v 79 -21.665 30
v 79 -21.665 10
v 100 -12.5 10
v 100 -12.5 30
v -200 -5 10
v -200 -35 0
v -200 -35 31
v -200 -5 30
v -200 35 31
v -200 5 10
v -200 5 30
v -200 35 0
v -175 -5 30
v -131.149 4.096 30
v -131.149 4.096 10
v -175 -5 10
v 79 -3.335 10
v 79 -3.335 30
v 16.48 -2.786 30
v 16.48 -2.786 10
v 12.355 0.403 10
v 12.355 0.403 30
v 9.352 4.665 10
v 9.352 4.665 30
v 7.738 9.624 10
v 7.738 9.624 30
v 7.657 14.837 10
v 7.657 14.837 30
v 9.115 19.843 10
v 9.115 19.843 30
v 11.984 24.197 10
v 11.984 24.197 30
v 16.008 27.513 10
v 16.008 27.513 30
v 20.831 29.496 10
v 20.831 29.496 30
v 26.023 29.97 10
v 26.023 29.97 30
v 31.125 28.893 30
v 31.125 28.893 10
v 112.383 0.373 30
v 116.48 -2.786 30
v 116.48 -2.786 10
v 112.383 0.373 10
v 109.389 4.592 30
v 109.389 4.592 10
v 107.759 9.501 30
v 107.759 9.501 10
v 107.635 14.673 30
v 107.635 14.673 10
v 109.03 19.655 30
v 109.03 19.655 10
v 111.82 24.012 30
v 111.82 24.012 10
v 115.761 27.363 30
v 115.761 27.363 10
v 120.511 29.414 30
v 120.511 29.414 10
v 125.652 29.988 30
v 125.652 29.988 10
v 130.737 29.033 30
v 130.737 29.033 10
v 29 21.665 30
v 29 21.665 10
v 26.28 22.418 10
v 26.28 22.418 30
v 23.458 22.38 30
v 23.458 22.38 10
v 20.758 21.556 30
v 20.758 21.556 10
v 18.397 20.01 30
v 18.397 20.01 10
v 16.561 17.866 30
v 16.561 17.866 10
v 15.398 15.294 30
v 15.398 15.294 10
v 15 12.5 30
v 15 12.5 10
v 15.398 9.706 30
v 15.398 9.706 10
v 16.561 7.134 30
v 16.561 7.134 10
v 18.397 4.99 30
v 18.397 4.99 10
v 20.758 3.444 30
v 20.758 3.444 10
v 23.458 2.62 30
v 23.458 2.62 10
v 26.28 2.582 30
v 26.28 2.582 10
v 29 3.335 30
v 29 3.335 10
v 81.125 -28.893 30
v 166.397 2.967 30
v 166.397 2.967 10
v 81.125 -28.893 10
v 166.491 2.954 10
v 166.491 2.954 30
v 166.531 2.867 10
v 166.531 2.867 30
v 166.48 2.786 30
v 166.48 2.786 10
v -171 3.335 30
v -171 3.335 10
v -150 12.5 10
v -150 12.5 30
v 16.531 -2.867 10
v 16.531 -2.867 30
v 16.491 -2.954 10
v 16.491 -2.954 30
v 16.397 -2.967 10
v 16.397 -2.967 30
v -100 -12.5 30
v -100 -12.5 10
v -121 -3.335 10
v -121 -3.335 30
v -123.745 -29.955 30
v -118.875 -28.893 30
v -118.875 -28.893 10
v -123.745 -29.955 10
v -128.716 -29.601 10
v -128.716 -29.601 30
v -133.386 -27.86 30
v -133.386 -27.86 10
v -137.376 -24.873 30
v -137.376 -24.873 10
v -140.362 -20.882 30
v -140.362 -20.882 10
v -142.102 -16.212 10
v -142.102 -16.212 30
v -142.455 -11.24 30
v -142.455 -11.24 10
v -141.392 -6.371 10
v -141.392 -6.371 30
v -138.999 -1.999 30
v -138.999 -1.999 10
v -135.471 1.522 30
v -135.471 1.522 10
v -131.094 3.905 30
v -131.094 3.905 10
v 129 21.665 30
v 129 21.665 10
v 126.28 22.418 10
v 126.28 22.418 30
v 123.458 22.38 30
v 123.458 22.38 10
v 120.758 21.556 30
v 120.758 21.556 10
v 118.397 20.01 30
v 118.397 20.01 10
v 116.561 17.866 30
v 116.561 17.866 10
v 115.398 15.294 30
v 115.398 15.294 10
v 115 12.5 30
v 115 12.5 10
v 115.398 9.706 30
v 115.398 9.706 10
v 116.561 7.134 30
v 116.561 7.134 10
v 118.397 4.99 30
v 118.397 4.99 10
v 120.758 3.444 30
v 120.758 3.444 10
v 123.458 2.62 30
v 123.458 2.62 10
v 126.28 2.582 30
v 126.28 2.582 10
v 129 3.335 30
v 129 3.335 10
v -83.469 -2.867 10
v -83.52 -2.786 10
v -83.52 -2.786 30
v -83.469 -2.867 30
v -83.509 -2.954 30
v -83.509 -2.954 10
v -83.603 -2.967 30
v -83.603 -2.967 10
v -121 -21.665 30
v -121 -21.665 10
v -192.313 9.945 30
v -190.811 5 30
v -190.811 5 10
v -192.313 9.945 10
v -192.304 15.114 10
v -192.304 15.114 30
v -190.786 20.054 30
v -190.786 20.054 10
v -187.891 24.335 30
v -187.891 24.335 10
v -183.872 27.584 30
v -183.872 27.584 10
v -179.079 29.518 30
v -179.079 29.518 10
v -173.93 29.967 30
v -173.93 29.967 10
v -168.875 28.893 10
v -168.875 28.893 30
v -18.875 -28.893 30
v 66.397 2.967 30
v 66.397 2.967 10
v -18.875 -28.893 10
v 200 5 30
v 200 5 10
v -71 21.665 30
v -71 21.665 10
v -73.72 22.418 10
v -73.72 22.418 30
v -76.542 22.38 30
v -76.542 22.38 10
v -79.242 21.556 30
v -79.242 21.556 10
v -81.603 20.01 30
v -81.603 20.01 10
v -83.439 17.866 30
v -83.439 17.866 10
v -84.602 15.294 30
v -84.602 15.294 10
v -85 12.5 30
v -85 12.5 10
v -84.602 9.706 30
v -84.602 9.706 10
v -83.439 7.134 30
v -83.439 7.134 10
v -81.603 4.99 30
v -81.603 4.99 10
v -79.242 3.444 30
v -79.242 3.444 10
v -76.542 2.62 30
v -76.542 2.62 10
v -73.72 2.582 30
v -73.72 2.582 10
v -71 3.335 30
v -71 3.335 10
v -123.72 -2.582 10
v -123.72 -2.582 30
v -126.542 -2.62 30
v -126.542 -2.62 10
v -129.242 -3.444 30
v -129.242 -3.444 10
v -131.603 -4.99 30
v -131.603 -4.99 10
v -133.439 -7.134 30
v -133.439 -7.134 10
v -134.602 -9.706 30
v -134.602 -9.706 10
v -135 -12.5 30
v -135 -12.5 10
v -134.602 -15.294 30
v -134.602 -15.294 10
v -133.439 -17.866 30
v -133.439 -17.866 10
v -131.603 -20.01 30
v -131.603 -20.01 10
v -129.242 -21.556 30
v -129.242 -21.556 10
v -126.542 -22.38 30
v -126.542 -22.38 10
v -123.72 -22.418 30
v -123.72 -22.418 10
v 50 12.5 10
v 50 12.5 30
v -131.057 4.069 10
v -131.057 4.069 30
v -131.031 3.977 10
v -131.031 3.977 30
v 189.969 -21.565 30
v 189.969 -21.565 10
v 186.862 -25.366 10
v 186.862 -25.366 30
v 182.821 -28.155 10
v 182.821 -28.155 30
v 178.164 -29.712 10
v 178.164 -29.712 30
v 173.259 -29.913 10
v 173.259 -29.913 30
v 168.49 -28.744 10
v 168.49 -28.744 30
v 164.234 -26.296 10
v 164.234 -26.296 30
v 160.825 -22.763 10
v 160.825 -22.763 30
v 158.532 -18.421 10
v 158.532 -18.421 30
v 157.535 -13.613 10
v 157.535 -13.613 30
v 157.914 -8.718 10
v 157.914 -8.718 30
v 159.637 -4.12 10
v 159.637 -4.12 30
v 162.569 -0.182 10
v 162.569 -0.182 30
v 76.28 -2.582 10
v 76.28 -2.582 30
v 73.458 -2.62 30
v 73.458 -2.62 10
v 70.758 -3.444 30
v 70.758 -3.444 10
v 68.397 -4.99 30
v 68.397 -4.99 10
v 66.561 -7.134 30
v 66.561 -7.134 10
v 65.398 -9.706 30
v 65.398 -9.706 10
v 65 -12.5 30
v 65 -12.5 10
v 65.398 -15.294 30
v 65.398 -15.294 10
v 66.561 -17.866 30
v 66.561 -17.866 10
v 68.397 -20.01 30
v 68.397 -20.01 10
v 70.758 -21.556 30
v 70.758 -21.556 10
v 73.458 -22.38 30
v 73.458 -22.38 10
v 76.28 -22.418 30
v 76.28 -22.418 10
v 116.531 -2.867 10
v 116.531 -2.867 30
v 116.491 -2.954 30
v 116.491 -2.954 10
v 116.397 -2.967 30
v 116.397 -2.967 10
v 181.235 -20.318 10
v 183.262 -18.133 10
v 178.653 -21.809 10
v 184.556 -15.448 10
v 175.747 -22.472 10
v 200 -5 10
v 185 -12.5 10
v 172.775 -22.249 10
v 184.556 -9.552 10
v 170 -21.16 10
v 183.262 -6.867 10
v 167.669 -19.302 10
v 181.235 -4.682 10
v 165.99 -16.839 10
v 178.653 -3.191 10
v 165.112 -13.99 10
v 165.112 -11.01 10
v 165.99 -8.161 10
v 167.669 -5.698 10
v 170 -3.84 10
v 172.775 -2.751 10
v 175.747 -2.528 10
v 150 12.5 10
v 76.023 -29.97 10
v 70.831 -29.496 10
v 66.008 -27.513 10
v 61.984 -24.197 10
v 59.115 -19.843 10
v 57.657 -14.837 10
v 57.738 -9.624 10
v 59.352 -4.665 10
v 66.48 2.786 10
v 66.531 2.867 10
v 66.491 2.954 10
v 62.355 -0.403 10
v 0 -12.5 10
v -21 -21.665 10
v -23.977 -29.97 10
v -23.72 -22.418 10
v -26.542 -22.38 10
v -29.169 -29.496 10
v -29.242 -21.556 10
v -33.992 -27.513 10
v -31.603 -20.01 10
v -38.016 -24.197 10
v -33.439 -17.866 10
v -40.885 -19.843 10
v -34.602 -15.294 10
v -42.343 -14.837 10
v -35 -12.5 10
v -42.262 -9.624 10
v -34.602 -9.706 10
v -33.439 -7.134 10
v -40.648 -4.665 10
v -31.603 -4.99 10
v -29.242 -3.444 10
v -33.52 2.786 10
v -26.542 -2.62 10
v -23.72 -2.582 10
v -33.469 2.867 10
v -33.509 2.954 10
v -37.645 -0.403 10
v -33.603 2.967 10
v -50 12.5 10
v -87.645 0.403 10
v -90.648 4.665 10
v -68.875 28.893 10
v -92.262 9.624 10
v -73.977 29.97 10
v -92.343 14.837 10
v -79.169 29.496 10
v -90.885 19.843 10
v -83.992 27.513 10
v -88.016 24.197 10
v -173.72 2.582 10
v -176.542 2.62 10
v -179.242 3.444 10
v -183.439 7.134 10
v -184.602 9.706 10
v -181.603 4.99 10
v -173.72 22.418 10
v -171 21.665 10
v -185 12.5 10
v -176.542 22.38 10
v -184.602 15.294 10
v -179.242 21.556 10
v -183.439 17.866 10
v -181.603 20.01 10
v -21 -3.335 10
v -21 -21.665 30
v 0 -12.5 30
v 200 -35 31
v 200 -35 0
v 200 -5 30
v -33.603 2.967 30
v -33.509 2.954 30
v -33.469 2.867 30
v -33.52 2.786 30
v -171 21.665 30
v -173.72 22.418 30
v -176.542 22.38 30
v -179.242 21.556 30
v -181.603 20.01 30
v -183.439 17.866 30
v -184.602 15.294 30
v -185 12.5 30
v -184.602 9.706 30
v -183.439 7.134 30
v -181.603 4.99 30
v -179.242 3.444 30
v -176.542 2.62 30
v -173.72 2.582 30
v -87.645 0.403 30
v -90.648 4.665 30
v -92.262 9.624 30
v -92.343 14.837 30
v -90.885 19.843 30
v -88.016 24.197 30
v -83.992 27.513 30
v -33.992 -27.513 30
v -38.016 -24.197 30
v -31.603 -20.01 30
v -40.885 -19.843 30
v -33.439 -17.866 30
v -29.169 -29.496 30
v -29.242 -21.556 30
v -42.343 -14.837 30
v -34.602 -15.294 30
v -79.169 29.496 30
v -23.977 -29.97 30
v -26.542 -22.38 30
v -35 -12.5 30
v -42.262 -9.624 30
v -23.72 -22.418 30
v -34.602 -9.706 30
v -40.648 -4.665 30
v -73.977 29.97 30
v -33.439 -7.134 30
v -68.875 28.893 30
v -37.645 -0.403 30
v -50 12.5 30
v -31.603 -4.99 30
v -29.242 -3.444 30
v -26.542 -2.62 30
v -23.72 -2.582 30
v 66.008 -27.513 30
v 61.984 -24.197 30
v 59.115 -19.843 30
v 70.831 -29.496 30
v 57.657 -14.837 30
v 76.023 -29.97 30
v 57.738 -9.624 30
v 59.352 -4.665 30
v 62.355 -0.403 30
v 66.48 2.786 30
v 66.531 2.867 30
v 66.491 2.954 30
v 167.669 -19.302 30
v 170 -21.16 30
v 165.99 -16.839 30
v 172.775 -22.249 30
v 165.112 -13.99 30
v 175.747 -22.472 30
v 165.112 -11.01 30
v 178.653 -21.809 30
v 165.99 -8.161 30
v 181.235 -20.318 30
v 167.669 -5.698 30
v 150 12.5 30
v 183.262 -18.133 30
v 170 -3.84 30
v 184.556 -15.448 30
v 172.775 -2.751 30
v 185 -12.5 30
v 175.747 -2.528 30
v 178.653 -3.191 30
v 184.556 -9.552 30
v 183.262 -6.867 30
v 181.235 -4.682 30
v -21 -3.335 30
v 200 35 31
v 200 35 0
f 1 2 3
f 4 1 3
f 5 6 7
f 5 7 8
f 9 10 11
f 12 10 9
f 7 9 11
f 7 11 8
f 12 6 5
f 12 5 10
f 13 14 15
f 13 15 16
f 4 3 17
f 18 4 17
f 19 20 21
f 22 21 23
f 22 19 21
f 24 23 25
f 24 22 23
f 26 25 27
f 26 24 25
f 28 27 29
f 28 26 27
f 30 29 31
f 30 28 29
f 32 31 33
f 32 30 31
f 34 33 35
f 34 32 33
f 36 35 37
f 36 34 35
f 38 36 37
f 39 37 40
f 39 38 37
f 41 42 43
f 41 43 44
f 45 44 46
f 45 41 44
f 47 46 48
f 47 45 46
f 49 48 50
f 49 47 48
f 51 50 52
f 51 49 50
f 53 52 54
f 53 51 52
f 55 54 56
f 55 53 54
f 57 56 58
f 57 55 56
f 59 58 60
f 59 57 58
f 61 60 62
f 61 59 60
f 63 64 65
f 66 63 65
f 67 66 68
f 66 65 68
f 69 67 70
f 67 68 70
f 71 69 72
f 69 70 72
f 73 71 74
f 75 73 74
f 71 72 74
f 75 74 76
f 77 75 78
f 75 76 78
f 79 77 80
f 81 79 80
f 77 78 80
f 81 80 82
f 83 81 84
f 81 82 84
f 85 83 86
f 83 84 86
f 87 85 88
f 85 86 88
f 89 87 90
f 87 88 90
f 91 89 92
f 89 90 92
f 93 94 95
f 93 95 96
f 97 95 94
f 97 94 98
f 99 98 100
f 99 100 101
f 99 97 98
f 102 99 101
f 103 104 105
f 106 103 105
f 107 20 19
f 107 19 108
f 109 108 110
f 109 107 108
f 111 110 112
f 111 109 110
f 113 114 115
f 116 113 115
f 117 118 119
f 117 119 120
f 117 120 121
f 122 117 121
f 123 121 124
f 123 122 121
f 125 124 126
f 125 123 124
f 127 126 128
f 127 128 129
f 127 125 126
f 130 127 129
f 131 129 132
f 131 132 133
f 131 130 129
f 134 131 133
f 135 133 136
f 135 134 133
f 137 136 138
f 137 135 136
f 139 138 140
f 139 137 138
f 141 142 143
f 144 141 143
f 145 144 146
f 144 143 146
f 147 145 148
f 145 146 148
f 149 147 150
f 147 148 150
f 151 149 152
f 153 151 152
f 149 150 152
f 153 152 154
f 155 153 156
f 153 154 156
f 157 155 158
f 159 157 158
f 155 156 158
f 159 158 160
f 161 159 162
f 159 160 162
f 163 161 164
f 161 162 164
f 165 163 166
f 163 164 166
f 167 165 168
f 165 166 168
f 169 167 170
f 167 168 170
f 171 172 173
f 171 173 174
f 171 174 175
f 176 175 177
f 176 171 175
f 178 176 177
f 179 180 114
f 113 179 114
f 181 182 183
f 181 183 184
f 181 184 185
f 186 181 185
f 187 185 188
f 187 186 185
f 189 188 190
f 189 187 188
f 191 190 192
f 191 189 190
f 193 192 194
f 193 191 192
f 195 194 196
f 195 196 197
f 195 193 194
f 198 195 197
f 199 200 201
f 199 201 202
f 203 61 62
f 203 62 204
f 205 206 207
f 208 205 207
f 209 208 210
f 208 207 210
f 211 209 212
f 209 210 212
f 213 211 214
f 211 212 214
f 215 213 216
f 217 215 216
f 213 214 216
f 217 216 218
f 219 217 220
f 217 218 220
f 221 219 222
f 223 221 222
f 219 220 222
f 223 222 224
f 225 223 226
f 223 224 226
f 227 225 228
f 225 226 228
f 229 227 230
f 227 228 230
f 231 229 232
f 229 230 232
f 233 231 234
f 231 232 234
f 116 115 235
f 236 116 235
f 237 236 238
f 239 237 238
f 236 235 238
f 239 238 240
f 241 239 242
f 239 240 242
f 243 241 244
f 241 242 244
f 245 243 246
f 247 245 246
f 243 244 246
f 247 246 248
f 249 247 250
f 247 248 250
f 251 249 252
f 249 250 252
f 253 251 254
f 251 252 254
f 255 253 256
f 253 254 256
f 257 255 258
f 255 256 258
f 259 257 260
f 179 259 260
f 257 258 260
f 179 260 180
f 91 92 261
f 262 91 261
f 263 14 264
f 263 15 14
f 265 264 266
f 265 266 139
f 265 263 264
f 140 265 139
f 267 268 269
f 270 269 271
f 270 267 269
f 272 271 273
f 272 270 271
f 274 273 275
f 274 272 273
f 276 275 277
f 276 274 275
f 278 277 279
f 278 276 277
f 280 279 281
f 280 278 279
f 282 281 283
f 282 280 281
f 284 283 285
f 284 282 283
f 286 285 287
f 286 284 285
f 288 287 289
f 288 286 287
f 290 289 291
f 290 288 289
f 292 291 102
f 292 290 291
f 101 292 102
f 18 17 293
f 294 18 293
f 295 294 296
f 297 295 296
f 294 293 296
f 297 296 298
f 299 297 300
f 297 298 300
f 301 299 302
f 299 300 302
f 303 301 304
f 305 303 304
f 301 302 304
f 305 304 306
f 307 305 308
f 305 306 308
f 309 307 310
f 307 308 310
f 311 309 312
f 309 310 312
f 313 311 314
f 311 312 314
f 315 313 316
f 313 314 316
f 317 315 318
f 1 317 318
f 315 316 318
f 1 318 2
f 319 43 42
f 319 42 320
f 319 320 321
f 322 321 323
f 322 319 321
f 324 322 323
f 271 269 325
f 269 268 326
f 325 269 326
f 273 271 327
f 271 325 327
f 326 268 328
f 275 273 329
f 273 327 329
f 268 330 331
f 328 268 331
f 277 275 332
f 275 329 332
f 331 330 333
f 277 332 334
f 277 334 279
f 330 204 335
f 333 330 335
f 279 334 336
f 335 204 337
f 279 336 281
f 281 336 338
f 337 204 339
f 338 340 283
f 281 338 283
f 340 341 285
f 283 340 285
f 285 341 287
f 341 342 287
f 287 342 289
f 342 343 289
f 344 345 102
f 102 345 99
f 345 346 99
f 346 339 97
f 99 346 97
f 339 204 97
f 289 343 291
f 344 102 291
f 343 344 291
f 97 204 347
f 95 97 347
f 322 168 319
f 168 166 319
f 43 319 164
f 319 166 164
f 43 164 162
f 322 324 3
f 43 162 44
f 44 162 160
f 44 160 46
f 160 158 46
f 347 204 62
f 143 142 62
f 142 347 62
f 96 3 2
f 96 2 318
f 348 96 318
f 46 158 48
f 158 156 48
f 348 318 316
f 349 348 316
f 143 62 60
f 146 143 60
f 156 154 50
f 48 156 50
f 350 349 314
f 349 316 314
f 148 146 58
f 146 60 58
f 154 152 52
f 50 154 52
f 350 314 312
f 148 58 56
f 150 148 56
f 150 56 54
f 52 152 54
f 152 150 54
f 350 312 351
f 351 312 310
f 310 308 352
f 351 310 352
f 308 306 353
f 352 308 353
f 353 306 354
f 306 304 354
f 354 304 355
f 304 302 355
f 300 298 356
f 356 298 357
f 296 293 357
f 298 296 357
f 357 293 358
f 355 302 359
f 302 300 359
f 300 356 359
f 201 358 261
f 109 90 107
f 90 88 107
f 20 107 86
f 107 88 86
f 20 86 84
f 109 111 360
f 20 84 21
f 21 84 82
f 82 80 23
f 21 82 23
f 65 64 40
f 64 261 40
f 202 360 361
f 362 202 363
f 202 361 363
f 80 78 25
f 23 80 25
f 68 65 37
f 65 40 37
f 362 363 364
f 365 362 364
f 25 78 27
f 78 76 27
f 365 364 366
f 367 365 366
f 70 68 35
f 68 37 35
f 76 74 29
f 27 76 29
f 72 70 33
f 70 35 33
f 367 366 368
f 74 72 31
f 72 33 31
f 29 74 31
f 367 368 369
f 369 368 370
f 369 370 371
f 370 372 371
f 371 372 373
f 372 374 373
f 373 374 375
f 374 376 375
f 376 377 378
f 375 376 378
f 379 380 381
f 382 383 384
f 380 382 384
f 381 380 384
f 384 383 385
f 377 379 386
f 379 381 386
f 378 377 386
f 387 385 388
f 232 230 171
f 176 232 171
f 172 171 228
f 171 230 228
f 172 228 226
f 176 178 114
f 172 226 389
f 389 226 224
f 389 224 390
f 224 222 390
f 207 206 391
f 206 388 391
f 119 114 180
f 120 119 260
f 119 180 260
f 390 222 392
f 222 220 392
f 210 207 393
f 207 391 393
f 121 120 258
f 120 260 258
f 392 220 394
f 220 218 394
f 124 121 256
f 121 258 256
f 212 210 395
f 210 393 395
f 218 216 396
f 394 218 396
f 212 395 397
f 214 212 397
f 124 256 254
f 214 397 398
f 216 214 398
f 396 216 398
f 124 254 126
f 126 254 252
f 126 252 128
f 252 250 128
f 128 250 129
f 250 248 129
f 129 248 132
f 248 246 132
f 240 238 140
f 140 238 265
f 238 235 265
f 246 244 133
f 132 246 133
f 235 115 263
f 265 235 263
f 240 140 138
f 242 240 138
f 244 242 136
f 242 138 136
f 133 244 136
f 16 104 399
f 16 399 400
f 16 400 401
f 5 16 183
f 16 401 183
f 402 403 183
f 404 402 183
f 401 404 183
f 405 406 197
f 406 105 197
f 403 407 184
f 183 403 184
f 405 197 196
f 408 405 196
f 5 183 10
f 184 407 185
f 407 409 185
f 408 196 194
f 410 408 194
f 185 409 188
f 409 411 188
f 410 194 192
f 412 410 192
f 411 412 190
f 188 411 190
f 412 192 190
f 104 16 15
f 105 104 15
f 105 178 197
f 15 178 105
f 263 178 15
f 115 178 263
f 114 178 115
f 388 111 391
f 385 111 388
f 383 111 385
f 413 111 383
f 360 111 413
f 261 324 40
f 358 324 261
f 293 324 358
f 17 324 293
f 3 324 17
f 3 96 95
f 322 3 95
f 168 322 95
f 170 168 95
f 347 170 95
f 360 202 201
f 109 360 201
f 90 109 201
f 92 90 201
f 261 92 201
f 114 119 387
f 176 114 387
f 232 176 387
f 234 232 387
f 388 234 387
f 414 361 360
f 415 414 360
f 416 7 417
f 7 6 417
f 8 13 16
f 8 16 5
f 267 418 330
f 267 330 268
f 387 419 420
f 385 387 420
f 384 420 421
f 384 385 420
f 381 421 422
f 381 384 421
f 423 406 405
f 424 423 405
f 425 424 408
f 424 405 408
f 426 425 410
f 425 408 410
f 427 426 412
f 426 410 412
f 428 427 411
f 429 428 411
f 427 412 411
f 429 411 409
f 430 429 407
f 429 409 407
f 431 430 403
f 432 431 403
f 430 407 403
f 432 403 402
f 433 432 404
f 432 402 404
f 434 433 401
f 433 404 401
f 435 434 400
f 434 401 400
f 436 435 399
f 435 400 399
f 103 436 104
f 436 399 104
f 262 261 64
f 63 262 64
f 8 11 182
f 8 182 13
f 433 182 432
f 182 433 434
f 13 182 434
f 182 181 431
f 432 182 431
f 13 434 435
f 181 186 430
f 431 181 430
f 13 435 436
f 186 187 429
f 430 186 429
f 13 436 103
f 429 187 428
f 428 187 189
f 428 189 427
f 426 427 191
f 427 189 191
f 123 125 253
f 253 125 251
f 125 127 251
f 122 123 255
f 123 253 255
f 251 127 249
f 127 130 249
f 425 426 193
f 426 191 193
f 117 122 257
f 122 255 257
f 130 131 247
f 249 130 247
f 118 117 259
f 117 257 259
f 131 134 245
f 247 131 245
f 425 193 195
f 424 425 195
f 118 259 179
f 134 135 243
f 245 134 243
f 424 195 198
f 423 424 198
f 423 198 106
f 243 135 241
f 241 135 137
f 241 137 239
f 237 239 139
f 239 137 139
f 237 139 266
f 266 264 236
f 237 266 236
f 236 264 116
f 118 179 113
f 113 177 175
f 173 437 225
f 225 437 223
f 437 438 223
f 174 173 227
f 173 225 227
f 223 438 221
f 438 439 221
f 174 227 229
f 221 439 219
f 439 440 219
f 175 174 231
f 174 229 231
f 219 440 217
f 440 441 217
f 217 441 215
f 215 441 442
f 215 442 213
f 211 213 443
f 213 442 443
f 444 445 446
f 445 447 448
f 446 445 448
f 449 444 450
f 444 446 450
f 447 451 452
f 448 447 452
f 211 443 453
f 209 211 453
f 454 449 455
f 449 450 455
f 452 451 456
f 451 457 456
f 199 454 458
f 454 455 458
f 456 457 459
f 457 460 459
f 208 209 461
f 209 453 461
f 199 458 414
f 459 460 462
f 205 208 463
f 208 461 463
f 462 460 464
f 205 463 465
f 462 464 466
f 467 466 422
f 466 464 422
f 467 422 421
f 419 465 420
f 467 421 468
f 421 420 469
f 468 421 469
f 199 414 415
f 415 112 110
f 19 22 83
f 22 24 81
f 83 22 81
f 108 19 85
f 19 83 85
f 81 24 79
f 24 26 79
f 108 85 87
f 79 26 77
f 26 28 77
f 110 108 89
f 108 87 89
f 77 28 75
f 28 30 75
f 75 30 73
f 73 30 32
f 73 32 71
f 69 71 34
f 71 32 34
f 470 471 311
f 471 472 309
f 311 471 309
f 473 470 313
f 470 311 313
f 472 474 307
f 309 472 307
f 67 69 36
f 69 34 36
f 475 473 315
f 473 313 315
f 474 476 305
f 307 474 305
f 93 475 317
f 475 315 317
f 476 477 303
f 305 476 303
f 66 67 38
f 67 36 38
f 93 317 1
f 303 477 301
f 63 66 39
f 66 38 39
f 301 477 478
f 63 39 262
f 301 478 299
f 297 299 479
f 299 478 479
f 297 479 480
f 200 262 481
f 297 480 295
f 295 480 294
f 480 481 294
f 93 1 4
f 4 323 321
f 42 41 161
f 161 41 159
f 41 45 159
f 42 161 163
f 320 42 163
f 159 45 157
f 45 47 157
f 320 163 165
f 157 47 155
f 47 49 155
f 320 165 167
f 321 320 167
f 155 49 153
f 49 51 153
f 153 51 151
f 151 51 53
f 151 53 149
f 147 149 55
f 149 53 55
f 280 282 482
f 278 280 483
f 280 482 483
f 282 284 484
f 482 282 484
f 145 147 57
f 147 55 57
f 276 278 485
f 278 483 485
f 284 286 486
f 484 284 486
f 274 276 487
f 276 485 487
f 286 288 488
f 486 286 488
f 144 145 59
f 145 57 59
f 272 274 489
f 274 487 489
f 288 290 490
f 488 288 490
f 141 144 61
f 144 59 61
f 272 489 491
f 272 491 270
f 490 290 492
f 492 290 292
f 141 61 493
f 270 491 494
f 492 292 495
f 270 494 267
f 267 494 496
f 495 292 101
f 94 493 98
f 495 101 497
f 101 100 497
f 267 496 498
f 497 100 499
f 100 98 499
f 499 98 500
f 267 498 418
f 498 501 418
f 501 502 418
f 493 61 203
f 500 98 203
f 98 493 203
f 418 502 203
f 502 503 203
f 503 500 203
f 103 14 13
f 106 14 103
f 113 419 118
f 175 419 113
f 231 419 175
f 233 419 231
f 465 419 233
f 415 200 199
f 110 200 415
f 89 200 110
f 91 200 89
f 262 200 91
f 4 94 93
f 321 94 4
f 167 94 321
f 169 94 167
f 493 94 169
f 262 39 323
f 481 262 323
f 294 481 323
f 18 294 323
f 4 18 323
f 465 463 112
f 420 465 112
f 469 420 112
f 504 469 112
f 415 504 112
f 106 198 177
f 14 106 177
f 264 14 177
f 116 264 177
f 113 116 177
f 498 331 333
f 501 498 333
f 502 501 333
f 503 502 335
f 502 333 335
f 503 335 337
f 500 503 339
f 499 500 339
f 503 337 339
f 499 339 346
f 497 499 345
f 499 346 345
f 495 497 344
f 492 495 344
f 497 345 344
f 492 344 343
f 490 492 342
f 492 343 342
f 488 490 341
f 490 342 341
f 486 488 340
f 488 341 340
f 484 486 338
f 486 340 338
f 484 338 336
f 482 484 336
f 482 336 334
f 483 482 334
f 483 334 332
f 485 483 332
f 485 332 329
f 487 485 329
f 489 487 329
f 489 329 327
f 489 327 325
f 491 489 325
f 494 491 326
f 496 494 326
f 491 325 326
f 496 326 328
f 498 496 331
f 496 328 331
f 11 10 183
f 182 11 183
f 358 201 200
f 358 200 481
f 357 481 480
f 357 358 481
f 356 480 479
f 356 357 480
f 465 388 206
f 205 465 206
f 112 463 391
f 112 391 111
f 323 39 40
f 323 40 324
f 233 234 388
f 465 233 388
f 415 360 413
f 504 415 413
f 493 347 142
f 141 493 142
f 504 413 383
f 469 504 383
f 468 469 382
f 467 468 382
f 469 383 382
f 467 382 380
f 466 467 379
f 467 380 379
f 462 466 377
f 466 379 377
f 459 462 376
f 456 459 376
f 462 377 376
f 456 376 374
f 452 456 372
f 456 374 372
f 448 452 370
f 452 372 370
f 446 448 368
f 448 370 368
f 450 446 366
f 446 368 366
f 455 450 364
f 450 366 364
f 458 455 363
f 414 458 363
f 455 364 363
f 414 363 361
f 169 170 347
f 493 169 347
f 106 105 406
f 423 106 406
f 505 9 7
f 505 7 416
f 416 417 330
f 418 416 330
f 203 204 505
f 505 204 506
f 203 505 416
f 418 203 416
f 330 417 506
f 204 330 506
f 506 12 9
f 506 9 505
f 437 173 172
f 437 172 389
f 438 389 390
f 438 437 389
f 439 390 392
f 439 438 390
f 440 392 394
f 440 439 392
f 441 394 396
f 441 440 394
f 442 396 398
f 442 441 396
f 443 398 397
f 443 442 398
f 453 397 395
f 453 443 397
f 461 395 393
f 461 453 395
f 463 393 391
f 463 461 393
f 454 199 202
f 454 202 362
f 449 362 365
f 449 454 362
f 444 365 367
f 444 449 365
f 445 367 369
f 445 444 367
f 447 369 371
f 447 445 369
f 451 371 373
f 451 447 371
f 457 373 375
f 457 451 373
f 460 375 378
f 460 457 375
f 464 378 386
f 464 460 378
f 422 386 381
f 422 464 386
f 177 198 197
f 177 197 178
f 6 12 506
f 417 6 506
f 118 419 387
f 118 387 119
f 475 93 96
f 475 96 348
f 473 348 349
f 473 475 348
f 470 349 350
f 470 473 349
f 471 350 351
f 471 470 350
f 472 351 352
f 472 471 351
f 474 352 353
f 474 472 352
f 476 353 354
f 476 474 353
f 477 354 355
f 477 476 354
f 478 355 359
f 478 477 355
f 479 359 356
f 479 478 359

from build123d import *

# Parameters (mm, degrees)
SKETCH1_W           = 400
SKETCH1_H           = 70
BOSS_EXTRUDE1_DEPTH = 30
CUT_EXTRUDE1_DEPTH  = 20
FILLET1_R           = 0.1
FILLET2_START       = 10
FILLET2_DEPTH       = 21
BOSS_EXTRUDE2_DEPTH = 20
LPATTERN1_COUNT     = 4
LPATTERN1_PITCH     = 100
BOSS_EXTRUDE3_DEPTH = 20
LPATTERN2_COUNT     = 3
LPATTERN2_PITCH     = 100
SKETCH5_R           = 10
BOSS_EXTRUDE4_DEPTH = 20
SKETCH6_W           = 400
SKETCH6_H           = 70
BOSS_EXTRUDE5_DEPTH = 1


with BuildPart() as part:
    # Sketch1 → Boss-Extrude1 (new body)
    with BuildSketch(Plane.XY):
        Rectangle(SKETCH1_W, SKETCH1_H)
    extrude(amount=BOSS_EXTRUDE1_DEPTH)

    # Sketch2 → Cut-Extrude1 (cut)
    with BuildSketch(Plane.XY.offset(30)):
        with BuildLine():
            Line((-128.697541479, 4.604917042), (-175, -5))
            Line((-175, -5), (-200, -5))
            Line((-200, -5), (-200, 5))
            Line((-200, 5), (-190.811388301, 5))
            ThreePointArc((-190.811388301, 5), (-187.890958939, 24.335251481), (-168.875, 28.893119746))
            Line((-168.875, 28.893119746), (-81.125, -3.893119746))
            ThreePointArc((-81.125, -3.893119746), (-91.393119746, 18.625), (-68.875, 28.893119746))
            Line((-68.875, 28.893119746), (18.875, -3.893119746))
            ThreePointArc((18.875, -3.893119746), (8.606880254, 18.625), (31.125, 28.893119746))
            Line((31.125, 28.893119746), (118.875, -3.893119746))
            ThreePointArc((118.875, -3.893119746), (108.53578111, 18.431230593), (130.736636107, 29.033027738))
            Line((130.736636107, 29.033027738), (200, 5))
            Line((200, 5), (200, -5))
            Line((200, -5), (189.969387627, -21.564625424))
            ThreePointArc((189.969387627, -21.564625424), (161.524837834, -23.665572292), (168.875, 3.893119746))
            Line((168.875, 3.893119746), (81.125, -28.893119746))
            ThreePointArc((81.125, -28.893119746), (58.606880254, -18.625), (68.875, 3.893119746))
            Line((68.875, 3.893119746), (-18.875, -28.893119746))
            ThreePointArc((-18.875, -28.893119746), (-41.393119746, -18.625), (-31.125, 3.893119746))
            Line((-31.125, 3.893119746), (-118.875, -28.893119746))
            ThreePointArc((-118.875, -28.893119746), (-141.792937679, -17.424149076), (-128.697541479, 4.604917042))
        make_face()
    extrude(amount=-CUT_EXTRUDE1_DEPTH, mode=Mode.SUBTRACT)

    # Fillet1
    fillet1_edges = [part.edges().sort_by_distance(p)[0] for p in [
        (-128.697541479, 4.604917042, 20),
    ]]
    fillet(fillet1_edges, radius=FILLET1_R)

    # Fillet2: read off the stored shape, not the designer's step
    # Fillet2 outline → Fillet2 (cut)
    with BuildSketch(Plane.XY.offset(FILLET2_START)):
        with BuildLine():
            ThreePointArc((-33.603406746, 2.967106787), (-33.477636502, 2.91539326), (-33.519722617, 2.786082773))
            ThreePointArc((-33.519722617, 2.786082773), (-32.343252539, 3.384792796), (-31.125, 3.893119746))
            Line((-31.125, 3.893119746), (-33.603406746, 2.967106787))
        make_face()
        with BuildLine():
            ThreePointArc((66.396593254, 2.967106787), (66.522363498, 2.91539326), (66.480277383, 2.786082773))
            ThreePointArc((66.480277383, 2.786082773), (67.656747461, 3.384792796), (68.875, 3.893119746))
            Line((68.875, 3.893119746), (66.396593254, 2.967106787))
        make_face()
        with BuildLine():
            ThreePointArc((166.396593254, 2.967106787), (166.522363498, 2.91539326), (166.480277383, 2.786082773))
            ThreePointArc((166.480277383, 2.786082773), (167.656747461, 3.384792796), (168.875, 3.893119746))
            Line((168.875, 3.893119746), (166.396593254, 2.967106787))
        make_face()
        with BuildLine():
            ThreePointArc((116.480277383, -2.786082773), (116.522363498, -2.91539326), (116.396593254, -2.967106787))
            Line((116.396593254, -2.967106787), (118.875, -3.893119746))
            ThreePointArc((118.875, -3.893119746), (117.656747461, -3.384792796), (116.480277383, -2.786082773))
        make_face()
        with BuildLine():
            ThreePointArc((-81.125, -3.893119746), (-82.343252539, -3.384792796), (-83.519722617, -2.786082773))
            ThreePointArc((-83.519722617, -2.786082773), (-83.477636502, -2.91539326), (-83.603406746, -2.967106787))
            Line((-83.603406746, -2.967106787), (-81.125, -3.893119746))
        make_face()
        with BuildLine():
            ThreePointArc((16.480277383, -2.786082773), (16.522363498, -2.91539326), (16.396593254, -2.967106787))
            Line((16.396593254, -2.967106787), (18.875, -3.893119746))
            ThreePointArc((18.875, -3.893119746), (17.656747461, -3.384792796), (16.480277383, -2.786082773))
        make_face()
    extrude(amount=FILLET2_DEPTH, mode=Mode.SUBTRACT)

    # Sketch3 → Boss-Extrude2 (add)
    with BuildSketch(Plane.XY.offset(10)):
        with BuildLine():
            Line((-171, 3.33484861), (-150, 12.5))
            Line((-150, 12.5), (-171, 21.66515139))
            ThreePointArc((-171, 21.66515139), (-185, 12.5), (-171, 3.33484861))
        make_face()
    boss_extrude2 = extrude(amount=BOSS_EXTRUDE2_DEPTH)

    # LPattern1: Boss-Extrude2 ×4
    with Locations(*[(i * LPATTERN1_PITCH, 0, 0) for i in range(1, LPATTERN1_COUNT)]):
        add(boss_extrude2)

    # Sketch4 → Boss-Extrude3 (add)
    with BuildSketch(Plane.XY.offset(10)):
        with BuildLine():
            Line((-121, -21.66515139), (-100, -12.5))
            Line((-100, -12.5), (-121, -3.33484861))
            ThreePointArc((-121, -3.33484861), (-135, -12.5), (-121, -21.66515139))
        make_face()
    boss_extrude3 = extrude(amount=BOSS_EXTRUDE3_DEPTH)

    # LPattern2: Boss-Extrude3 ×3
    with Locations(*[(i * LPATTERN2_PITCH, 0, 0) for i in range(1, LPATTERN2_COUNT)]):
        add(boss_extrude3)

    # Sketch5 → Boss-Extrude4 (add)
    with BuildSketch(Plane.XY.offset(10)):
        with Locations((175, -12.5)):
            Circle(SKETCH5_R)
    extrude(amount=BOSS_EXTRUDE4_DEPTH)

    # Sketch6 → Boss-Extrude5 (add)
    with BuildSketch(Plane.XY.offset(30)):
        Rectangle(SKETCH6_W, SKETCH6_H)
    extrude(amount=BOSS_EXTRUDE5_DEPTH)


solid = part.part
